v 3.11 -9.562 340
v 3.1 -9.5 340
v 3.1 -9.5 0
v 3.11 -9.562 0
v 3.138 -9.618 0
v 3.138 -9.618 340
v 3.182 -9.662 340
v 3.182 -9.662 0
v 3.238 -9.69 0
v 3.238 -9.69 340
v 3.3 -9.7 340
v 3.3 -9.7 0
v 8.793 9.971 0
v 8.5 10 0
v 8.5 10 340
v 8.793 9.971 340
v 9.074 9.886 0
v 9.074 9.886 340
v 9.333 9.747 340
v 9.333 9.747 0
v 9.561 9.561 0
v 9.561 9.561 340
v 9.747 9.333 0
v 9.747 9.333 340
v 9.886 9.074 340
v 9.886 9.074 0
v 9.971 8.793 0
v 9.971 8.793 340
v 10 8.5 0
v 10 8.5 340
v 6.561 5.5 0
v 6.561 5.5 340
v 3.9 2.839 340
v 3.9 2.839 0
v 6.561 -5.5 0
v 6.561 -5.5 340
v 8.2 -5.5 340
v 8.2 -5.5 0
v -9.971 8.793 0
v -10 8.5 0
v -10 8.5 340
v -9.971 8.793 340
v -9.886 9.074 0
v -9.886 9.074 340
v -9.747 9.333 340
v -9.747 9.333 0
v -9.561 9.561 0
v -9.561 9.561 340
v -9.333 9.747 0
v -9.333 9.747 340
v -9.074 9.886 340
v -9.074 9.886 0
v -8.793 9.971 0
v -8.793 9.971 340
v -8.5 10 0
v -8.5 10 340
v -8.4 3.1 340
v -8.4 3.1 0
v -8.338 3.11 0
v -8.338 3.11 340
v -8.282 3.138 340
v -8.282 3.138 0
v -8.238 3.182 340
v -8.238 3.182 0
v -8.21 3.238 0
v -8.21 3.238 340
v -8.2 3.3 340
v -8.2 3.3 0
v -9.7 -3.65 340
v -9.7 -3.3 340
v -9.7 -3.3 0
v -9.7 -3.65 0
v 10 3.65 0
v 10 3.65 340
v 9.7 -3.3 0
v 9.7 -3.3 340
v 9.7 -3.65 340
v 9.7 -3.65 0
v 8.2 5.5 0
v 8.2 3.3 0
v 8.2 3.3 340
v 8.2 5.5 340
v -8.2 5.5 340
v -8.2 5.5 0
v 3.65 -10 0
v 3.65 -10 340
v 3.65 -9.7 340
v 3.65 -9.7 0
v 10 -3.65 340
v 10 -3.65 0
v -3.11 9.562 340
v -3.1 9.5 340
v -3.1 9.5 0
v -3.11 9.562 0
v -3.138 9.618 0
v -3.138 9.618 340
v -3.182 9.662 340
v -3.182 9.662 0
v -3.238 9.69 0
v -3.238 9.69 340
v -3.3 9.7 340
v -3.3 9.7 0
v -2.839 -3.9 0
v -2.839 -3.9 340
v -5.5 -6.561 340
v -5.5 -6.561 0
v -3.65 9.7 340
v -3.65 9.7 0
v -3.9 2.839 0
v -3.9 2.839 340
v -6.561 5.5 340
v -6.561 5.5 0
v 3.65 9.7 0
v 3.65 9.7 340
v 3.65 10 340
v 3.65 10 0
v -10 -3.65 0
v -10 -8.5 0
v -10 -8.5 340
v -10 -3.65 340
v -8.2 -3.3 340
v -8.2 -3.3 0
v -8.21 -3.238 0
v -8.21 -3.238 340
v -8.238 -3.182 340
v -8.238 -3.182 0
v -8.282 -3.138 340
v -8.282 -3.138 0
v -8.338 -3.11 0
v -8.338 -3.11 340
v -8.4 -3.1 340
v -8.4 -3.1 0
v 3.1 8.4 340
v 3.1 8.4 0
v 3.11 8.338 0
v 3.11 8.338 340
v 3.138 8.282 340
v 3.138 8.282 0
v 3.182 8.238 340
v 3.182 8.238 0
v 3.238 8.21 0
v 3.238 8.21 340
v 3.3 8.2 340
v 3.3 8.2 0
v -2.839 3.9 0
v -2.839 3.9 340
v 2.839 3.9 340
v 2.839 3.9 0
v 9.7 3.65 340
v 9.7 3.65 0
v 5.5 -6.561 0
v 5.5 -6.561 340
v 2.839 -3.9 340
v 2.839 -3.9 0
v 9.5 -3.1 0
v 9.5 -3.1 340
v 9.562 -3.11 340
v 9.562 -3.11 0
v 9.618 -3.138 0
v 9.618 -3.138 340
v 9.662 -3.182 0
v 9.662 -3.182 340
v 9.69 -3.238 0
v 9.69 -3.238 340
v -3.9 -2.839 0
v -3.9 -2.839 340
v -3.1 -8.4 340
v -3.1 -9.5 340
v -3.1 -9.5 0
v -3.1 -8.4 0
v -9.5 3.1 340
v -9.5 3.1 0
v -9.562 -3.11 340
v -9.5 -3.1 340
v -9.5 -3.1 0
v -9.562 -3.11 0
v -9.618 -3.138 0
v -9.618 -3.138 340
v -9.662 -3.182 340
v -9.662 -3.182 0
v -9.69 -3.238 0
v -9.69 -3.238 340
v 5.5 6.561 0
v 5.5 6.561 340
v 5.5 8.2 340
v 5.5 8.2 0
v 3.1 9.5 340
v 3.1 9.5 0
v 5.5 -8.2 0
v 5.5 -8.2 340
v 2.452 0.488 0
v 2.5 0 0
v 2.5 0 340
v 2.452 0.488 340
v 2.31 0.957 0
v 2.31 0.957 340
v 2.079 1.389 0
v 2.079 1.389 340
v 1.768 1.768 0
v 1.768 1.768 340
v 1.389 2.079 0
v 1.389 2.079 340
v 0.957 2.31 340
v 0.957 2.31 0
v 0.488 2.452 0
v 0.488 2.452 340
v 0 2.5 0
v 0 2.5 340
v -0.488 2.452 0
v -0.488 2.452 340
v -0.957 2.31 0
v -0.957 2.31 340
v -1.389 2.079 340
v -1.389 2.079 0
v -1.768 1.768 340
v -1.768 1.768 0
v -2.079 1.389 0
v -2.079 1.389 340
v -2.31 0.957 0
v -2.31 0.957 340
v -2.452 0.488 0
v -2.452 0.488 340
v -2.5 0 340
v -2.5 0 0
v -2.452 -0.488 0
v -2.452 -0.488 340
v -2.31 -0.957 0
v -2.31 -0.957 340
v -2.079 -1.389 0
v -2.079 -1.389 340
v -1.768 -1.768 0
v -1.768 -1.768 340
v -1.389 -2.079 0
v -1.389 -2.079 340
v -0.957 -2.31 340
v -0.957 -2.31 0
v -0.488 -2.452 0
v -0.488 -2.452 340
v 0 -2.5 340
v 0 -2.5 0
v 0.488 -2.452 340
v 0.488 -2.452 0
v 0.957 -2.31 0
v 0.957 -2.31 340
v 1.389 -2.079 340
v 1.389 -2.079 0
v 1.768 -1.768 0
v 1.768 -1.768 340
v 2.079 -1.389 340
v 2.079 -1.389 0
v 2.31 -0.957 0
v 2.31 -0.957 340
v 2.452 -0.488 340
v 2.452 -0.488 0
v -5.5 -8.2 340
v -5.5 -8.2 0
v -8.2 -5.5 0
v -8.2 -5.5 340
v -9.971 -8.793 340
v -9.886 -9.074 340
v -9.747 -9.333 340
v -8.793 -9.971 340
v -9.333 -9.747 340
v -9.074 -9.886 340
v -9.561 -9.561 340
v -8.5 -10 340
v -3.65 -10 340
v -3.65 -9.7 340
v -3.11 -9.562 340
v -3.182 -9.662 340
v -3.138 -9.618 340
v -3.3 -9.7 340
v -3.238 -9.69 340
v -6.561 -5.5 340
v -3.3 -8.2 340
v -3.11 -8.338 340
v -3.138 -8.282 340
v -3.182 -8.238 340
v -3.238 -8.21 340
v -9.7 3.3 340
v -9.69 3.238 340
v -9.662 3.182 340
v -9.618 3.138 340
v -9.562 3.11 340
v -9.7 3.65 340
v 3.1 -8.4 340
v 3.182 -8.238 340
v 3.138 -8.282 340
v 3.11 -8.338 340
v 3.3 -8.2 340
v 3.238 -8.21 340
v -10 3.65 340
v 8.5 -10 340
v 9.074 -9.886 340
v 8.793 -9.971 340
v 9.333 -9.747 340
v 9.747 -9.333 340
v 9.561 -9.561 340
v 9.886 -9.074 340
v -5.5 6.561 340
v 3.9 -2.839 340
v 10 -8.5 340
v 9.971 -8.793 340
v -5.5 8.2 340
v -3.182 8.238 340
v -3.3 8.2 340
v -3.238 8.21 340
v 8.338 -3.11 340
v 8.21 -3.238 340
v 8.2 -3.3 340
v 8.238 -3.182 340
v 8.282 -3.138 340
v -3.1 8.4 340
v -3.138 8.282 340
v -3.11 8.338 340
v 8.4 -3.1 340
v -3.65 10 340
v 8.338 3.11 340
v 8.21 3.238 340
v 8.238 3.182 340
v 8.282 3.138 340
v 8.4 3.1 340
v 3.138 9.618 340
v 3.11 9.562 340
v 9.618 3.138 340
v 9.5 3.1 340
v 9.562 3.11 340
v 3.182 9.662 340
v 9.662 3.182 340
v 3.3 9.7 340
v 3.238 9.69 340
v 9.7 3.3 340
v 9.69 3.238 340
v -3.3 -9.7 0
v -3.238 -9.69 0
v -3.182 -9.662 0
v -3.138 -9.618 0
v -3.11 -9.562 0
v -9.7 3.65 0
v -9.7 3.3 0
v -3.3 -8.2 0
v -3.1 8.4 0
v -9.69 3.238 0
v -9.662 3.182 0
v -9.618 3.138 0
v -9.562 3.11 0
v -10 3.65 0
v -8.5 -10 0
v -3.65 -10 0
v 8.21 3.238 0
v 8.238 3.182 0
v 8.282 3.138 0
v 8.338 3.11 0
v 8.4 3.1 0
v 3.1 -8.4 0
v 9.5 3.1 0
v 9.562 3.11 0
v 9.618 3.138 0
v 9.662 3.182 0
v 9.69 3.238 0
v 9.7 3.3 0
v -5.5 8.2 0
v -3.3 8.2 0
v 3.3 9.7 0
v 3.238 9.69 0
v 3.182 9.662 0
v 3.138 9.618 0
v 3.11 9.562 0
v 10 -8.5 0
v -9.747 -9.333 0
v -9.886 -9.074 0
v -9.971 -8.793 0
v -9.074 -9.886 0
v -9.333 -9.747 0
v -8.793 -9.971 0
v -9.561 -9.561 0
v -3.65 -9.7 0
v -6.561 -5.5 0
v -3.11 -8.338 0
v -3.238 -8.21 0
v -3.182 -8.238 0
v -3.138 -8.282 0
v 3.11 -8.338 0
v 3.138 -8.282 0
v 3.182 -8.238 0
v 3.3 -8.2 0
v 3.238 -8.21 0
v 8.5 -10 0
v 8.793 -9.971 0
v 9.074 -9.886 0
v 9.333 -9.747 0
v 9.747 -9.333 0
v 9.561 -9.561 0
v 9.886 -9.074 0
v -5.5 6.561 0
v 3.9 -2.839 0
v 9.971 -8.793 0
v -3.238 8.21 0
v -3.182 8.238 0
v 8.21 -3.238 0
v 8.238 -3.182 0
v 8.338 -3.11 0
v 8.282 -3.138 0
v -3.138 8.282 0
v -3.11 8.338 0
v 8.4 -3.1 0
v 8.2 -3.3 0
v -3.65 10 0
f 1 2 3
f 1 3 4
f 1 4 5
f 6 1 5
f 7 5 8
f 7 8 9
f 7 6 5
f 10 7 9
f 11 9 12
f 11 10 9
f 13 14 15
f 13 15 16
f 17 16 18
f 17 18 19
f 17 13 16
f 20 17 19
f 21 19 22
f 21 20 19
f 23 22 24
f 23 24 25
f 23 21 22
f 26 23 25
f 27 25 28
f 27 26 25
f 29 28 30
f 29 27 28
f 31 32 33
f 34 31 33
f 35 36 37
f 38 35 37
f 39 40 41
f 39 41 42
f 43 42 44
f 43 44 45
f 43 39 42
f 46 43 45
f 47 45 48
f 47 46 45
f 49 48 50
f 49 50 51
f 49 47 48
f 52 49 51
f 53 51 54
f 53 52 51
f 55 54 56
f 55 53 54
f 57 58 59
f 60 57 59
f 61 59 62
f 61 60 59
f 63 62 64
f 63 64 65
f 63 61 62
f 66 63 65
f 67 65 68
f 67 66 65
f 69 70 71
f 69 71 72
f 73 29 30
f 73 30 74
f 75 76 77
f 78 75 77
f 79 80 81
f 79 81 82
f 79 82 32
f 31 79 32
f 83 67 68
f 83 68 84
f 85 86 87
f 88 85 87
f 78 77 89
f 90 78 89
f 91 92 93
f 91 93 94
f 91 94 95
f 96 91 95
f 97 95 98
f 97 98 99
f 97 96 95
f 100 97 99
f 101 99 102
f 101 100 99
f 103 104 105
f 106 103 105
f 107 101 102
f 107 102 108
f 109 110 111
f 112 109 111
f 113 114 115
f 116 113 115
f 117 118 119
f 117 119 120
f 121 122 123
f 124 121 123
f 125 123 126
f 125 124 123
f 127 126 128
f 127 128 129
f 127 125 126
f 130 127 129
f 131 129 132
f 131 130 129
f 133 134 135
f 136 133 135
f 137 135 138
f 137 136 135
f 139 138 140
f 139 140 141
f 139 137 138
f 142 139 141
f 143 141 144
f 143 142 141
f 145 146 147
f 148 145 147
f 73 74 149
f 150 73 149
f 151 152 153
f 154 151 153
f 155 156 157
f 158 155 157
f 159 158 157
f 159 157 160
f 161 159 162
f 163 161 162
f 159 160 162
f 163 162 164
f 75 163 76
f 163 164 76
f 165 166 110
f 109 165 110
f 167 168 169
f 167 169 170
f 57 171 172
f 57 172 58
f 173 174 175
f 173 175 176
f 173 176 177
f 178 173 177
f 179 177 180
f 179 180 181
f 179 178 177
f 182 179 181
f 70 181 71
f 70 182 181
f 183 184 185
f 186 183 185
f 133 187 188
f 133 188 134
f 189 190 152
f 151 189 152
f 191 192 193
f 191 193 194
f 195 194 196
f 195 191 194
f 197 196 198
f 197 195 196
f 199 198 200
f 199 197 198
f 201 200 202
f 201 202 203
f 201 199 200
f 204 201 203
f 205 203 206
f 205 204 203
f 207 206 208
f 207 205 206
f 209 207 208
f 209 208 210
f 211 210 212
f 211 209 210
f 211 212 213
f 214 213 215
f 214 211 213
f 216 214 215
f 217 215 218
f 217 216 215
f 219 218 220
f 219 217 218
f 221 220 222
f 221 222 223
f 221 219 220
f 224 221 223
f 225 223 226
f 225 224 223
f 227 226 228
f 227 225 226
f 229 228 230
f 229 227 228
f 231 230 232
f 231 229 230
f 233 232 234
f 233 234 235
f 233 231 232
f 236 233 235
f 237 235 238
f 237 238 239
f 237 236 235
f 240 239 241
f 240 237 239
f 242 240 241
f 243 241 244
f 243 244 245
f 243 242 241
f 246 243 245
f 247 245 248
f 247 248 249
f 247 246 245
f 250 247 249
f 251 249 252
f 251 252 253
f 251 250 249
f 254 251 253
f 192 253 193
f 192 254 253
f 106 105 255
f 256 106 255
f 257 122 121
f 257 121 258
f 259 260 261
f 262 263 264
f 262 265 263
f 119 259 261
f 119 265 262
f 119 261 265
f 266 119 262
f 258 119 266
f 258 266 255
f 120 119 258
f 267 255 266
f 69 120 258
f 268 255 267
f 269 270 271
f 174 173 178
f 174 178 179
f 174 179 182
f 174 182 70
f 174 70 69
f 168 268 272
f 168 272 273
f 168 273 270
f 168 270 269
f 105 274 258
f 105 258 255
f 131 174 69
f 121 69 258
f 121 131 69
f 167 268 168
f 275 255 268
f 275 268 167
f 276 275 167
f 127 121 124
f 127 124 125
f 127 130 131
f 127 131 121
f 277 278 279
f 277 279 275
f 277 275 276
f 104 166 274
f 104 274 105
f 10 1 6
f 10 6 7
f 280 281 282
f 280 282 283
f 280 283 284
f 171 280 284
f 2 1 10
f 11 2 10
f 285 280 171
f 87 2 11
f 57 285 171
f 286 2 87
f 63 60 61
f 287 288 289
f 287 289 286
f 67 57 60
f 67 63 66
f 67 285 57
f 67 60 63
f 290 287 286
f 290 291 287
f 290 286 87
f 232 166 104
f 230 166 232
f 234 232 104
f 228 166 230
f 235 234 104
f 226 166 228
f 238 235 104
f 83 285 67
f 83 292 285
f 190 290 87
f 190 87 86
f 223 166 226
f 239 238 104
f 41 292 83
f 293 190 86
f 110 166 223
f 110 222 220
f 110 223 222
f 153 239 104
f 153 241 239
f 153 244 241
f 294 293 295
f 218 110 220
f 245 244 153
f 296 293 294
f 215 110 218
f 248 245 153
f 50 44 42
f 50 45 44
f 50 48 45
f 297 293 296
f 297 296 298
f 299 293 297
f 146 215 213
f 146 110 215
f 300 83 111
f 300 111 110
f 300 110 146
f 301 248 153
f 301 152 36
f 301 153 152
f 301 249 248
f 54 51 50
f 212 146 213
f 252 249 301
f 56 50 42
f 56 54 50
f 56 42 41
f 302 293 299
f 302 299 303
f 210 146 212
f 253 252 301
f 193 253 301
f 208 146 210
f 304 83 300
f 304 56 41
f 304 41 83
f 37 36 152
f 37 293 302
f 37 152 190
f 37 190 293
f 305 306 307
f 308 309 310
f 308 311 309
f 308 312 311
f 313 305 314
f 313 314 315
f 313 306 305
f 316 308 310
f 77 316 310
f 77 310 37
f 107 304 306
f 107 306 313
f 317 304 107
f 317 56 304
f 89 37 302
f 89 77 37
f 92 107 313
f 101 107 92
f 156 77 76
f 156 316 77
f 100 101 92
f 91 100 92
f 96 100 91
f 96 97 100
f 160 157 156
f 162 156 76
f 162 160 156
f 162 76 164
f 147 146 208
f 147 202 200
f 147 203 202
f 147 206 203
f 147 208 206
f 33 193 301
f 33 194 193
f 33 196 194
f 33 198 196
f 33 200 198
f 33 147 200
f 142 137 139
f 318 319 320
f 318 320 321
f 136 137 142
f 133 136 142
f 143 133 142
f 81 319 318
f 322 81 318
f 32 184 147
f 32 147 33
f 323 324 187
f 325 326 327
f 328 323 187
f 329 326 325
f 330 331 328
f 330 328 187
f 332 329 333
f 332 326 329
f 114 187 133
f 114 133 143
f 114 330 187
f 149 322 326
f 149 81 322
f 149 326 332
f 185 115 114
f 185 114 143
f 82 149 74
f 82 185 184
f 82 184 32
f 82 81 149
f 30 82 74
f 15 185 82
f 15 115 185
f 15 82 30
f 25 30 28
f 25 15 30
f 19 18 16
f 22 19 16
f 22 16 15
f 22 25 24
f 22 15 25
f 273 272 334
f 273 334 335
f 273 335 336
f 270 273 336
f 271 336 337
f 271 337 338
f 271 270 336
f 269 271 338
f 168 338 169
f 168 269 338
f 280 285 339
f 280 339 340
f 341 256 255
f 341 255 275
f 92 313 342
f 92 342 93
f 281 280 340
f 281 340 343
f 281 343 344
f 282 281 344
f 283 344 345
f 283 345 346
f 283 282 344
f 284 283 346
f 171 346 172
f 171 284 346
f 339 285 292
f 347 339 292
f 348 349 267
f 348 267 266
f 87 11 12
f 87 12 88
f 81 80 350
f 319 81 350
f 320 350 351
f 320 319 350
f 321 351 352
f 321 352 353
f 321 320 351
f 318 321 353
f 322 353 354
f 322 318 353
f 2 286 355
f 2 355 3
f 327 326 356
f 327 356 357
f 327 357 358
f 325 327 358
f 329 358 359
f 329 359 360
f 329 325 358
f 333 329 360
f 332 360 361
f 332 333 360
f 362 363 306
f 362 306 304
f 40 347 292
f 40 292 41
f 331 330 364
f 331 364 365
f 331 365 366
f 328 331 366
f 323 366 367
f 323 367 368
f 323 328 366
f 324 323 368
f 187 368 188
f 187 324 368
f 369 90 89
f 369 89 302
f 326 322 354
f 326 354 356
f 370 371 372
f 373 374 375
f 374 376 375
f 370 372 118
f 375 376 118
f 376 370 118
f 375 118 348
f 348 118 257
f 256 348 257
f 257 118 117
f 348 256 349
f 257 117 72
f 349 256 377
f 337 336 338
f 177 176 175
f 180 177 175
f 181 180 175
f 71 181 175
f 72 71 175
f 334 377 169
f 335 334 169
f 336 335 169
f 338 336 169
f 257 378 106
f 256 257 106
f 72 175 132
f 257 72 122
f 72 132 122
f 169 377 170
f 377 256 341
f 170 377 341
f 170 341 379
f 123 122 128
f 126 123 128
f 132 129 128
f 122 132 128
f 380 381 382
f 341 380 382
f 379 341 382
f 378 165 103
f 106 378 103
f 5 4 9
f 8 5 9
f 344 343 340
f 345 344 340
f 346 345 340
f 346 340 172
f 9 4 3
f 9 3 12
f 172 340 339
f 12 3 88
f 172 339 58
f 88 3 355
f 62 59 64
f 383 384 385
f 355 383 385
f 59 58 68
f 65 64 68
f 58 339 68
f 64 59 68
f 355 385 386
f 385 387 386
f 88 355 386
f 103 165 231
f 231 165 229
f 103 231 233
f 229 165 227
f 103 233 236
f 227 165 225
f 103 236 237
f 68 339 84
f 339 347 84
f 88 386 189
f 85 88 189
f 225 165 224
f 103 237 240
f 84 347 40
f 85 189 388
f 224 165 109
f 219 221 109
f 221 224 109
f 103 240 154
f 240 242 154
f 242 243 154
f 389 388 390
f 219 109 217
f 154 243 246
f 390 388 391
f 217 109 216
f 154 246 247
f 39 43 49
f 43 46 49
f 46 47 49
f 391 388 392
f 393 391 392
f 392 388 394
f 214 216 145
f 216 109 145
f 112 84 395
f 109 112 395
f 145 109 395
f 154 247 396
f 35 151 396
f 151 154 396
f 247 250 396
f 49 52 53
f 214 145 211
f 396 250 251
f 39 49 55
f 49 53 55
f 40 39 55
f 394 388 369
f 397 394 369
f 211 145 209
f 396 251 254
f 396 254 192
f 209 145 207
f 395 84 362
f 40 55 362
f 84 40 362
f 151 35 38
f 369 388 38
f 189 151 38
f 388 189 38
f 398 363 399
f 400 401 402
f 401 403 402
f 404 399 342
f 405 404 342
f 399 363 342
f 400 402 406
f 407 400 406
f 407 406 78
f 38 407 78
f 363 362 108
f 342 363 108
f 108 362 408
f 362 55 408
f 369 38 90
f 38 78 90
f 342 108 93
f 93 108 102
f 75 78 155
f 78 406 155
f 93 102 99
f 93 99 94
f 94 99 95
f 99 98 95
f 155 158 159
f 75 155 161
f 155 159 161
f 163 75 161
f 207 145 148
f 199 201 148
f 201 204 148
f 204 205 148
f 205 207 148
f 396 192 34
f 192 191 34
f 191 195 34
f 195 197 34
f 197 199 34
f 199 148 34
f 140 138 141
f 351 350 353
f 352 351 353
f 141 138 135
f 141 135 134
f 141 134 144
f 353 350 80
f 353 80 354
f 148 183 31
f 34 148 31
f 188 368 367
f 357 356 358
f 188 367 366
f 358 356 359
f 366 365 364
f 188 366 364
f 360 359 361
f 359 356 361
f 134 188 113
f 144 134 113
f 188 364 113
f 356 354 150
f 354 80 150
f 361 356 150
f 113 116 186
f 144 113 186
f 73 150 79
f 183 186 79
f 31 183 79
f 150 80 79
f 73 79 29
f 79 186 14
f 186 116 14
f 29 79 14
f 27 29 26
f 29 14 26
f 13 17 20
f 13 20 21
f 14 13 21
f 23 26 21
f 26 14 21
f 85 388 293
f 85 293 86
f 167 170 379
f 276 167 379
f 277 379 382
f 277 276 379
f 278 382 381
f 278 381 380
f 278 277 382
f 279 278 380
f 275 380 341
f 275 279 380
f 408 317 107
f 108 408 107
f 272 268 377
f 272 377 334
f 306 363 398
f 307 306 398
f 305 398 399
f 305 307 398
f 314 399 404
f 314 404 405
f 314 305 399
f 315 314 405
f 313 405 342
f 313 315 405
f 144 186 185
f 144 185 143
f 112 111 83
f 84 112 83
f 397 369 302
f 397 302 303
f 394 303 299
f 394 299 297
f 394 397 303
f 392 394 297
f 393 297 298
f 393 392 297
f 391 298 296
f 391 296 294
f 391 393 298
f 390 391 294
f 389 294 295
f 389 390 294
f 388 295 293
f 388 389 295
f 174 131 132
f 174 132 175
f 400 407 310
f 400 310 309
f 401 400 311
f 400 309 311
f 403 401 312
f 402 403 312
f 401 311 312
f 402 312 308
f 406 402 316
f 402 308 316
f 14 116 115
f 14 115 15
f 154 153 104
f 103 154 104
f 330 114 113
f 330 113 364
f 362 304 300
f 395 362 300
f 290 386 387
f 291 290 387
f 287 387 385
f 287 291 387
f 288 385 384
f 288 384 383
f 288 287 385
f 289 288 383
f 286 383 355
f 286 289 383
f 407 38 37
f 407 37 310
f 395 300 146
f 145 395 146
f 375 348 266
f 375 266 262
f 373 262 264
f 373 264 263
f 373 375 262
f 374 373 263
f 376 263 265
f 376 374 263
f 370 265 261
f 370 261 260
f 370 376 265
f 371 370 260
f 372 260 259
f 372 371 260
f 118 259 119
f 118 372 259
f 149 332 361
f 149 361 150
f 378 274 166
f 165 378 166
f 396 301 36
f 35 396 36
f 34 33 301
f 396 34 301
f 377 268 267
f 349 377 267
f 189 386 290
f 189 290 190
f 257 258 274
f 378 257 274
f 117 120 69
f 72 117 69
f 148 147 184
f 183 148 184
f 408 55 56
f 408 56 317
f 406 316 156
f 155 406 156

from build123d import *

# Parameters (mm, degrees)
SKETCH_1_R      = 2.5
EXTRUDE_2_DEPTH = 340
EXTRUDE_3_DEPTH = 340


with BuildPart() as part:
    # 草图1 → 凸台-拉伸2 (new body)
    with BuildSketch(Plane.XY):
        with BuildLine():
            Line((3.65, 10), (8.5, 10))
            ThreePointArc((8.5, 10), (9.560660172, 9.560660172), (10, 8.5))
            Line((10, 8.5), (10, 3.65))
            Line((10, 3.65), (8.2, 3.65))
            Line((8.2, 3.65), (8.2, 5.5))
            Line((8.2, 5.5), (6.560660172, 5.5))
            Line((6.560660172, 5.5), (3.9, 2.839339828))
            Line((3.9, 2.839339828), (3.9, -2.839339828))
            Line((3.9, -2.839339828), (6.560660172, -5.5))
            Line((6.560660172, -5.5), (8.2, -5.5))
            Line((8.2, -5.5), (8.2, -3.65))
            Line((8.2, -3.65), (10, -3.65))
            Line((10, -3.65), (10, -8.5))
            ThreePointArc((10, -8.5), (9.560660172, -9.560660172), (8.5, -10))
            Line((8.5, -10), (3.65, -10))
            Line((3.65, -10), (3.65, -8.2))
            Line((3.65, -8.2), (5.5, -8.2))
            Line((5.5, -8.2), (5.5, -6.560660172))
            Line((5.5, -6.560660172), (2.839339828, -3.9))
            Line((2.839339828, -3.9), (-2.839339828, -3.9))
            Line((-2.839339828, -3.9), (-5.5, -6.560660172))
            Line((-5.5, -6.560660172), (-5.5, -8.2))
            Line((-5.5, -8.2), (-3.65, -8.2))
            Line((-3.65, -8.2), (-3.65, -10))
            Line((-3.65, -10), (-8.5, -10))
            ThreePointArc((-8.5, -10), (-9.560660172, -9.560660172), (-10, -8.5))
            Line((-10, -8.5), (-10, -3.65))
            Line((-10, -3.65), (-8.2, -3.65))
            Line((-8.2, -3.65), (-8.2, -5.5))
            Line((-8.2, -5.5), (-6.560660172, -5.5))
            Line((-6.560660172, -5.5), (-3.9, -2.839339828))
            Line((-3.9, -2.839339828), (-3.9, 2.839339828))
            Line((-3.9, 2.839339828), (-6.560660172, 5.5))
            Line((-6.560660172, 5.5), (-8.2, 5.5))
            Line((-8.2, 5.5), (-8.2, 3.65))
            Line((-8.2, 3.65), (-10, 3.65))
            Line((-10, 3.65), (-10, 8.5))
            ThreePointArc((-10, 8.5), (-9.560660172, 9.560660172), (-8.5, 10))
            Line((-8.5, 10), (-3.65, 10))
            Line((-3.65, 10), (-3.65, 8.2))
            Line((-3.65, 8.2), (-5.5, 8.2))
            Line((-5.5, 8.2), (-5.5, 6.560660172))
            Line((-5.5, 6.560660172), (-2.839339828, 3.9))
            Line((-2.839339828, 3.9), (2.839339828, 3.9))
            Line((2.839339828, 3.9), (5.5, 6.560660172))
            Line((5.5, 6.560660172), (5.5, 8.2))
            Line((5.5, 8.2), (3.65, 8.2))
            Line((3.65, 8.2), (3.65, 10))
        make_face()
        Circle(SKETCH_1_R, mode=Mode.SUBTRACT)
    extrude(amount=EXTRUDE_2_DEPTH)

    # 草图3 → 凸台-拉伸3 (add)
    with BuildSketch(Plane.XY.offset(340)):
        with BuildLine():
            Line((-8.2, 3.65), (-9.7, 3.65))
            Line((-9.7, 3.65), (-9.7, 3.3))
            ThreePointArc((-9.7, 3.3), (-9.641421356, 3.158578644), (-9.5, 3.1))
            Line((-9.5, 3.1), (-8.4, 3.1))
            ThreePointArc((-8.4, 3.1), (-8.258578644, 3.158578644), (-8.2, 3.3))
            Line((-8.2, 3.3), (-8.2, 3.65))
        make_face()
        with BuildLine():
            Line((-3.65, 9.7), (-3.65, 8.2))
            Line((-3.65, 8.2), (-3.3, 8.2))
            ThreePointArc((-3.3, 8.2), (-3.158578644, 8.258578644), (-3.1, 8.4))
            Line((-3.1, 8.4), (-3.1, 9.5))
            ThreePointArc((-3.1, 9.5), (-3.158578644, 9.641421356), (-3.3, 9.7))
            Line((-3.3, 9.7), (-3.65, 9.7))
        make_face()
        with BuildLine():
            Line((3.65, 8.2), (3.65, 9.7))
            Line((3.65, 9.7), (3.3, 9.7))
            ThreePointArc((3.3, 9.7), (3.158578644, 9.641421356), (3.1, 9.5))
            Line((3.1, 9.5), (3.1, 8.4))
            ThreePointArc((3.1, 8.4), (3.158578644, 8.258578644), (3.3, 8.2))
            Line((3.3, 8.2), (3.65, 8.2))
        make_face()
        with BuildLine():
            Line((9.7, 3.65), (8.2, 3.65))
            Line((8.2, 3.65), (8.2, 3.3))
            ThreePointArc((8.2, 3.3), (8.258578644, 3.158578644), (8.4, 3.1))
            Line((8.4, 3.1), (9.5, 3.1))
            ThreePointArc((9.5, 3.1), (9.641421356, 3.158578644), (9.7, 3.3))
            Line((9.7, 3.3), (9.7, 3.65))
        make_face()
        with BuildLine():
            Line((3.65, -9.7), (3.65, -8.2))
            Line((3.65, -8.2), (3.3, -8.2))
            ThreePointArc((3.3, -8.2), (3.158578644, -8.258578644), (3.1, -8.4))
            Line((3.1, -8.4), (3.1, -9.5))
            ThreePointArc((3.1, -9.5), (3.158578644, -9.641421356), (3.3, -9.7))
            Line((3.3, -9.7), (3.65, -9.7))
        make_face()
        with BuildLine():
            Line((-3.65, -8.2), (-3.65, -9.7))
            Line((-3.65, -9.7), (-3.3, -9.7))
            ThreePointArc((-3.3, -9.7), (-3.158578644, -9.641421356), (-3.1, -9.5))
            Line((-3.1, -9.5), (-3.1, -8.4))
            ThreePointArc((-3.1, -8.4), (-3.158578644, -8.258578644), (-3.3, -8.2))
            Line((-3.3, -8.2), (-3.65, -8.2))
        make_face()
        with BuildLine():
            Line((8.2, -3.65), (8.2, -3.3))
            ThreePointArc((8.2, -3.3), (8.258578644, -3.158578644), (8.4, -3.1))
            Line((8.4, -3.1), (9.5, -3.1))
            ThreePointArc((9.5, -3.1), (9.641421356, -3.158578644), (9.7, -3.3))
            Line((9.7, -3.3), (9.7, -3.65))
            Line((9.7, -3.65), (8.2, -3.65))
        make_face()
        with BuildLine():
            Line((-8.2, -3.65), (-8.2, -3.3))
            ThreePointArc((-8.2, -3.3), (-8.258578644, -3.158578644), (-8.4, -3.1))
            Line((-8.4, -3.1), (-9.5, -3.1))
            ThreePointArc((-9.5, -3.1), (-9.641421356, -3.158578644), (-9.7, -3.3))
            Line((-9.7, -3.3), (-9.7, -3.65))
            Line((-9.7, -3.65), (-8.2, -3.65))
        make_face()
    extrude(amount=-EXTRUDE_3_DEPTH)


solid = part.part
